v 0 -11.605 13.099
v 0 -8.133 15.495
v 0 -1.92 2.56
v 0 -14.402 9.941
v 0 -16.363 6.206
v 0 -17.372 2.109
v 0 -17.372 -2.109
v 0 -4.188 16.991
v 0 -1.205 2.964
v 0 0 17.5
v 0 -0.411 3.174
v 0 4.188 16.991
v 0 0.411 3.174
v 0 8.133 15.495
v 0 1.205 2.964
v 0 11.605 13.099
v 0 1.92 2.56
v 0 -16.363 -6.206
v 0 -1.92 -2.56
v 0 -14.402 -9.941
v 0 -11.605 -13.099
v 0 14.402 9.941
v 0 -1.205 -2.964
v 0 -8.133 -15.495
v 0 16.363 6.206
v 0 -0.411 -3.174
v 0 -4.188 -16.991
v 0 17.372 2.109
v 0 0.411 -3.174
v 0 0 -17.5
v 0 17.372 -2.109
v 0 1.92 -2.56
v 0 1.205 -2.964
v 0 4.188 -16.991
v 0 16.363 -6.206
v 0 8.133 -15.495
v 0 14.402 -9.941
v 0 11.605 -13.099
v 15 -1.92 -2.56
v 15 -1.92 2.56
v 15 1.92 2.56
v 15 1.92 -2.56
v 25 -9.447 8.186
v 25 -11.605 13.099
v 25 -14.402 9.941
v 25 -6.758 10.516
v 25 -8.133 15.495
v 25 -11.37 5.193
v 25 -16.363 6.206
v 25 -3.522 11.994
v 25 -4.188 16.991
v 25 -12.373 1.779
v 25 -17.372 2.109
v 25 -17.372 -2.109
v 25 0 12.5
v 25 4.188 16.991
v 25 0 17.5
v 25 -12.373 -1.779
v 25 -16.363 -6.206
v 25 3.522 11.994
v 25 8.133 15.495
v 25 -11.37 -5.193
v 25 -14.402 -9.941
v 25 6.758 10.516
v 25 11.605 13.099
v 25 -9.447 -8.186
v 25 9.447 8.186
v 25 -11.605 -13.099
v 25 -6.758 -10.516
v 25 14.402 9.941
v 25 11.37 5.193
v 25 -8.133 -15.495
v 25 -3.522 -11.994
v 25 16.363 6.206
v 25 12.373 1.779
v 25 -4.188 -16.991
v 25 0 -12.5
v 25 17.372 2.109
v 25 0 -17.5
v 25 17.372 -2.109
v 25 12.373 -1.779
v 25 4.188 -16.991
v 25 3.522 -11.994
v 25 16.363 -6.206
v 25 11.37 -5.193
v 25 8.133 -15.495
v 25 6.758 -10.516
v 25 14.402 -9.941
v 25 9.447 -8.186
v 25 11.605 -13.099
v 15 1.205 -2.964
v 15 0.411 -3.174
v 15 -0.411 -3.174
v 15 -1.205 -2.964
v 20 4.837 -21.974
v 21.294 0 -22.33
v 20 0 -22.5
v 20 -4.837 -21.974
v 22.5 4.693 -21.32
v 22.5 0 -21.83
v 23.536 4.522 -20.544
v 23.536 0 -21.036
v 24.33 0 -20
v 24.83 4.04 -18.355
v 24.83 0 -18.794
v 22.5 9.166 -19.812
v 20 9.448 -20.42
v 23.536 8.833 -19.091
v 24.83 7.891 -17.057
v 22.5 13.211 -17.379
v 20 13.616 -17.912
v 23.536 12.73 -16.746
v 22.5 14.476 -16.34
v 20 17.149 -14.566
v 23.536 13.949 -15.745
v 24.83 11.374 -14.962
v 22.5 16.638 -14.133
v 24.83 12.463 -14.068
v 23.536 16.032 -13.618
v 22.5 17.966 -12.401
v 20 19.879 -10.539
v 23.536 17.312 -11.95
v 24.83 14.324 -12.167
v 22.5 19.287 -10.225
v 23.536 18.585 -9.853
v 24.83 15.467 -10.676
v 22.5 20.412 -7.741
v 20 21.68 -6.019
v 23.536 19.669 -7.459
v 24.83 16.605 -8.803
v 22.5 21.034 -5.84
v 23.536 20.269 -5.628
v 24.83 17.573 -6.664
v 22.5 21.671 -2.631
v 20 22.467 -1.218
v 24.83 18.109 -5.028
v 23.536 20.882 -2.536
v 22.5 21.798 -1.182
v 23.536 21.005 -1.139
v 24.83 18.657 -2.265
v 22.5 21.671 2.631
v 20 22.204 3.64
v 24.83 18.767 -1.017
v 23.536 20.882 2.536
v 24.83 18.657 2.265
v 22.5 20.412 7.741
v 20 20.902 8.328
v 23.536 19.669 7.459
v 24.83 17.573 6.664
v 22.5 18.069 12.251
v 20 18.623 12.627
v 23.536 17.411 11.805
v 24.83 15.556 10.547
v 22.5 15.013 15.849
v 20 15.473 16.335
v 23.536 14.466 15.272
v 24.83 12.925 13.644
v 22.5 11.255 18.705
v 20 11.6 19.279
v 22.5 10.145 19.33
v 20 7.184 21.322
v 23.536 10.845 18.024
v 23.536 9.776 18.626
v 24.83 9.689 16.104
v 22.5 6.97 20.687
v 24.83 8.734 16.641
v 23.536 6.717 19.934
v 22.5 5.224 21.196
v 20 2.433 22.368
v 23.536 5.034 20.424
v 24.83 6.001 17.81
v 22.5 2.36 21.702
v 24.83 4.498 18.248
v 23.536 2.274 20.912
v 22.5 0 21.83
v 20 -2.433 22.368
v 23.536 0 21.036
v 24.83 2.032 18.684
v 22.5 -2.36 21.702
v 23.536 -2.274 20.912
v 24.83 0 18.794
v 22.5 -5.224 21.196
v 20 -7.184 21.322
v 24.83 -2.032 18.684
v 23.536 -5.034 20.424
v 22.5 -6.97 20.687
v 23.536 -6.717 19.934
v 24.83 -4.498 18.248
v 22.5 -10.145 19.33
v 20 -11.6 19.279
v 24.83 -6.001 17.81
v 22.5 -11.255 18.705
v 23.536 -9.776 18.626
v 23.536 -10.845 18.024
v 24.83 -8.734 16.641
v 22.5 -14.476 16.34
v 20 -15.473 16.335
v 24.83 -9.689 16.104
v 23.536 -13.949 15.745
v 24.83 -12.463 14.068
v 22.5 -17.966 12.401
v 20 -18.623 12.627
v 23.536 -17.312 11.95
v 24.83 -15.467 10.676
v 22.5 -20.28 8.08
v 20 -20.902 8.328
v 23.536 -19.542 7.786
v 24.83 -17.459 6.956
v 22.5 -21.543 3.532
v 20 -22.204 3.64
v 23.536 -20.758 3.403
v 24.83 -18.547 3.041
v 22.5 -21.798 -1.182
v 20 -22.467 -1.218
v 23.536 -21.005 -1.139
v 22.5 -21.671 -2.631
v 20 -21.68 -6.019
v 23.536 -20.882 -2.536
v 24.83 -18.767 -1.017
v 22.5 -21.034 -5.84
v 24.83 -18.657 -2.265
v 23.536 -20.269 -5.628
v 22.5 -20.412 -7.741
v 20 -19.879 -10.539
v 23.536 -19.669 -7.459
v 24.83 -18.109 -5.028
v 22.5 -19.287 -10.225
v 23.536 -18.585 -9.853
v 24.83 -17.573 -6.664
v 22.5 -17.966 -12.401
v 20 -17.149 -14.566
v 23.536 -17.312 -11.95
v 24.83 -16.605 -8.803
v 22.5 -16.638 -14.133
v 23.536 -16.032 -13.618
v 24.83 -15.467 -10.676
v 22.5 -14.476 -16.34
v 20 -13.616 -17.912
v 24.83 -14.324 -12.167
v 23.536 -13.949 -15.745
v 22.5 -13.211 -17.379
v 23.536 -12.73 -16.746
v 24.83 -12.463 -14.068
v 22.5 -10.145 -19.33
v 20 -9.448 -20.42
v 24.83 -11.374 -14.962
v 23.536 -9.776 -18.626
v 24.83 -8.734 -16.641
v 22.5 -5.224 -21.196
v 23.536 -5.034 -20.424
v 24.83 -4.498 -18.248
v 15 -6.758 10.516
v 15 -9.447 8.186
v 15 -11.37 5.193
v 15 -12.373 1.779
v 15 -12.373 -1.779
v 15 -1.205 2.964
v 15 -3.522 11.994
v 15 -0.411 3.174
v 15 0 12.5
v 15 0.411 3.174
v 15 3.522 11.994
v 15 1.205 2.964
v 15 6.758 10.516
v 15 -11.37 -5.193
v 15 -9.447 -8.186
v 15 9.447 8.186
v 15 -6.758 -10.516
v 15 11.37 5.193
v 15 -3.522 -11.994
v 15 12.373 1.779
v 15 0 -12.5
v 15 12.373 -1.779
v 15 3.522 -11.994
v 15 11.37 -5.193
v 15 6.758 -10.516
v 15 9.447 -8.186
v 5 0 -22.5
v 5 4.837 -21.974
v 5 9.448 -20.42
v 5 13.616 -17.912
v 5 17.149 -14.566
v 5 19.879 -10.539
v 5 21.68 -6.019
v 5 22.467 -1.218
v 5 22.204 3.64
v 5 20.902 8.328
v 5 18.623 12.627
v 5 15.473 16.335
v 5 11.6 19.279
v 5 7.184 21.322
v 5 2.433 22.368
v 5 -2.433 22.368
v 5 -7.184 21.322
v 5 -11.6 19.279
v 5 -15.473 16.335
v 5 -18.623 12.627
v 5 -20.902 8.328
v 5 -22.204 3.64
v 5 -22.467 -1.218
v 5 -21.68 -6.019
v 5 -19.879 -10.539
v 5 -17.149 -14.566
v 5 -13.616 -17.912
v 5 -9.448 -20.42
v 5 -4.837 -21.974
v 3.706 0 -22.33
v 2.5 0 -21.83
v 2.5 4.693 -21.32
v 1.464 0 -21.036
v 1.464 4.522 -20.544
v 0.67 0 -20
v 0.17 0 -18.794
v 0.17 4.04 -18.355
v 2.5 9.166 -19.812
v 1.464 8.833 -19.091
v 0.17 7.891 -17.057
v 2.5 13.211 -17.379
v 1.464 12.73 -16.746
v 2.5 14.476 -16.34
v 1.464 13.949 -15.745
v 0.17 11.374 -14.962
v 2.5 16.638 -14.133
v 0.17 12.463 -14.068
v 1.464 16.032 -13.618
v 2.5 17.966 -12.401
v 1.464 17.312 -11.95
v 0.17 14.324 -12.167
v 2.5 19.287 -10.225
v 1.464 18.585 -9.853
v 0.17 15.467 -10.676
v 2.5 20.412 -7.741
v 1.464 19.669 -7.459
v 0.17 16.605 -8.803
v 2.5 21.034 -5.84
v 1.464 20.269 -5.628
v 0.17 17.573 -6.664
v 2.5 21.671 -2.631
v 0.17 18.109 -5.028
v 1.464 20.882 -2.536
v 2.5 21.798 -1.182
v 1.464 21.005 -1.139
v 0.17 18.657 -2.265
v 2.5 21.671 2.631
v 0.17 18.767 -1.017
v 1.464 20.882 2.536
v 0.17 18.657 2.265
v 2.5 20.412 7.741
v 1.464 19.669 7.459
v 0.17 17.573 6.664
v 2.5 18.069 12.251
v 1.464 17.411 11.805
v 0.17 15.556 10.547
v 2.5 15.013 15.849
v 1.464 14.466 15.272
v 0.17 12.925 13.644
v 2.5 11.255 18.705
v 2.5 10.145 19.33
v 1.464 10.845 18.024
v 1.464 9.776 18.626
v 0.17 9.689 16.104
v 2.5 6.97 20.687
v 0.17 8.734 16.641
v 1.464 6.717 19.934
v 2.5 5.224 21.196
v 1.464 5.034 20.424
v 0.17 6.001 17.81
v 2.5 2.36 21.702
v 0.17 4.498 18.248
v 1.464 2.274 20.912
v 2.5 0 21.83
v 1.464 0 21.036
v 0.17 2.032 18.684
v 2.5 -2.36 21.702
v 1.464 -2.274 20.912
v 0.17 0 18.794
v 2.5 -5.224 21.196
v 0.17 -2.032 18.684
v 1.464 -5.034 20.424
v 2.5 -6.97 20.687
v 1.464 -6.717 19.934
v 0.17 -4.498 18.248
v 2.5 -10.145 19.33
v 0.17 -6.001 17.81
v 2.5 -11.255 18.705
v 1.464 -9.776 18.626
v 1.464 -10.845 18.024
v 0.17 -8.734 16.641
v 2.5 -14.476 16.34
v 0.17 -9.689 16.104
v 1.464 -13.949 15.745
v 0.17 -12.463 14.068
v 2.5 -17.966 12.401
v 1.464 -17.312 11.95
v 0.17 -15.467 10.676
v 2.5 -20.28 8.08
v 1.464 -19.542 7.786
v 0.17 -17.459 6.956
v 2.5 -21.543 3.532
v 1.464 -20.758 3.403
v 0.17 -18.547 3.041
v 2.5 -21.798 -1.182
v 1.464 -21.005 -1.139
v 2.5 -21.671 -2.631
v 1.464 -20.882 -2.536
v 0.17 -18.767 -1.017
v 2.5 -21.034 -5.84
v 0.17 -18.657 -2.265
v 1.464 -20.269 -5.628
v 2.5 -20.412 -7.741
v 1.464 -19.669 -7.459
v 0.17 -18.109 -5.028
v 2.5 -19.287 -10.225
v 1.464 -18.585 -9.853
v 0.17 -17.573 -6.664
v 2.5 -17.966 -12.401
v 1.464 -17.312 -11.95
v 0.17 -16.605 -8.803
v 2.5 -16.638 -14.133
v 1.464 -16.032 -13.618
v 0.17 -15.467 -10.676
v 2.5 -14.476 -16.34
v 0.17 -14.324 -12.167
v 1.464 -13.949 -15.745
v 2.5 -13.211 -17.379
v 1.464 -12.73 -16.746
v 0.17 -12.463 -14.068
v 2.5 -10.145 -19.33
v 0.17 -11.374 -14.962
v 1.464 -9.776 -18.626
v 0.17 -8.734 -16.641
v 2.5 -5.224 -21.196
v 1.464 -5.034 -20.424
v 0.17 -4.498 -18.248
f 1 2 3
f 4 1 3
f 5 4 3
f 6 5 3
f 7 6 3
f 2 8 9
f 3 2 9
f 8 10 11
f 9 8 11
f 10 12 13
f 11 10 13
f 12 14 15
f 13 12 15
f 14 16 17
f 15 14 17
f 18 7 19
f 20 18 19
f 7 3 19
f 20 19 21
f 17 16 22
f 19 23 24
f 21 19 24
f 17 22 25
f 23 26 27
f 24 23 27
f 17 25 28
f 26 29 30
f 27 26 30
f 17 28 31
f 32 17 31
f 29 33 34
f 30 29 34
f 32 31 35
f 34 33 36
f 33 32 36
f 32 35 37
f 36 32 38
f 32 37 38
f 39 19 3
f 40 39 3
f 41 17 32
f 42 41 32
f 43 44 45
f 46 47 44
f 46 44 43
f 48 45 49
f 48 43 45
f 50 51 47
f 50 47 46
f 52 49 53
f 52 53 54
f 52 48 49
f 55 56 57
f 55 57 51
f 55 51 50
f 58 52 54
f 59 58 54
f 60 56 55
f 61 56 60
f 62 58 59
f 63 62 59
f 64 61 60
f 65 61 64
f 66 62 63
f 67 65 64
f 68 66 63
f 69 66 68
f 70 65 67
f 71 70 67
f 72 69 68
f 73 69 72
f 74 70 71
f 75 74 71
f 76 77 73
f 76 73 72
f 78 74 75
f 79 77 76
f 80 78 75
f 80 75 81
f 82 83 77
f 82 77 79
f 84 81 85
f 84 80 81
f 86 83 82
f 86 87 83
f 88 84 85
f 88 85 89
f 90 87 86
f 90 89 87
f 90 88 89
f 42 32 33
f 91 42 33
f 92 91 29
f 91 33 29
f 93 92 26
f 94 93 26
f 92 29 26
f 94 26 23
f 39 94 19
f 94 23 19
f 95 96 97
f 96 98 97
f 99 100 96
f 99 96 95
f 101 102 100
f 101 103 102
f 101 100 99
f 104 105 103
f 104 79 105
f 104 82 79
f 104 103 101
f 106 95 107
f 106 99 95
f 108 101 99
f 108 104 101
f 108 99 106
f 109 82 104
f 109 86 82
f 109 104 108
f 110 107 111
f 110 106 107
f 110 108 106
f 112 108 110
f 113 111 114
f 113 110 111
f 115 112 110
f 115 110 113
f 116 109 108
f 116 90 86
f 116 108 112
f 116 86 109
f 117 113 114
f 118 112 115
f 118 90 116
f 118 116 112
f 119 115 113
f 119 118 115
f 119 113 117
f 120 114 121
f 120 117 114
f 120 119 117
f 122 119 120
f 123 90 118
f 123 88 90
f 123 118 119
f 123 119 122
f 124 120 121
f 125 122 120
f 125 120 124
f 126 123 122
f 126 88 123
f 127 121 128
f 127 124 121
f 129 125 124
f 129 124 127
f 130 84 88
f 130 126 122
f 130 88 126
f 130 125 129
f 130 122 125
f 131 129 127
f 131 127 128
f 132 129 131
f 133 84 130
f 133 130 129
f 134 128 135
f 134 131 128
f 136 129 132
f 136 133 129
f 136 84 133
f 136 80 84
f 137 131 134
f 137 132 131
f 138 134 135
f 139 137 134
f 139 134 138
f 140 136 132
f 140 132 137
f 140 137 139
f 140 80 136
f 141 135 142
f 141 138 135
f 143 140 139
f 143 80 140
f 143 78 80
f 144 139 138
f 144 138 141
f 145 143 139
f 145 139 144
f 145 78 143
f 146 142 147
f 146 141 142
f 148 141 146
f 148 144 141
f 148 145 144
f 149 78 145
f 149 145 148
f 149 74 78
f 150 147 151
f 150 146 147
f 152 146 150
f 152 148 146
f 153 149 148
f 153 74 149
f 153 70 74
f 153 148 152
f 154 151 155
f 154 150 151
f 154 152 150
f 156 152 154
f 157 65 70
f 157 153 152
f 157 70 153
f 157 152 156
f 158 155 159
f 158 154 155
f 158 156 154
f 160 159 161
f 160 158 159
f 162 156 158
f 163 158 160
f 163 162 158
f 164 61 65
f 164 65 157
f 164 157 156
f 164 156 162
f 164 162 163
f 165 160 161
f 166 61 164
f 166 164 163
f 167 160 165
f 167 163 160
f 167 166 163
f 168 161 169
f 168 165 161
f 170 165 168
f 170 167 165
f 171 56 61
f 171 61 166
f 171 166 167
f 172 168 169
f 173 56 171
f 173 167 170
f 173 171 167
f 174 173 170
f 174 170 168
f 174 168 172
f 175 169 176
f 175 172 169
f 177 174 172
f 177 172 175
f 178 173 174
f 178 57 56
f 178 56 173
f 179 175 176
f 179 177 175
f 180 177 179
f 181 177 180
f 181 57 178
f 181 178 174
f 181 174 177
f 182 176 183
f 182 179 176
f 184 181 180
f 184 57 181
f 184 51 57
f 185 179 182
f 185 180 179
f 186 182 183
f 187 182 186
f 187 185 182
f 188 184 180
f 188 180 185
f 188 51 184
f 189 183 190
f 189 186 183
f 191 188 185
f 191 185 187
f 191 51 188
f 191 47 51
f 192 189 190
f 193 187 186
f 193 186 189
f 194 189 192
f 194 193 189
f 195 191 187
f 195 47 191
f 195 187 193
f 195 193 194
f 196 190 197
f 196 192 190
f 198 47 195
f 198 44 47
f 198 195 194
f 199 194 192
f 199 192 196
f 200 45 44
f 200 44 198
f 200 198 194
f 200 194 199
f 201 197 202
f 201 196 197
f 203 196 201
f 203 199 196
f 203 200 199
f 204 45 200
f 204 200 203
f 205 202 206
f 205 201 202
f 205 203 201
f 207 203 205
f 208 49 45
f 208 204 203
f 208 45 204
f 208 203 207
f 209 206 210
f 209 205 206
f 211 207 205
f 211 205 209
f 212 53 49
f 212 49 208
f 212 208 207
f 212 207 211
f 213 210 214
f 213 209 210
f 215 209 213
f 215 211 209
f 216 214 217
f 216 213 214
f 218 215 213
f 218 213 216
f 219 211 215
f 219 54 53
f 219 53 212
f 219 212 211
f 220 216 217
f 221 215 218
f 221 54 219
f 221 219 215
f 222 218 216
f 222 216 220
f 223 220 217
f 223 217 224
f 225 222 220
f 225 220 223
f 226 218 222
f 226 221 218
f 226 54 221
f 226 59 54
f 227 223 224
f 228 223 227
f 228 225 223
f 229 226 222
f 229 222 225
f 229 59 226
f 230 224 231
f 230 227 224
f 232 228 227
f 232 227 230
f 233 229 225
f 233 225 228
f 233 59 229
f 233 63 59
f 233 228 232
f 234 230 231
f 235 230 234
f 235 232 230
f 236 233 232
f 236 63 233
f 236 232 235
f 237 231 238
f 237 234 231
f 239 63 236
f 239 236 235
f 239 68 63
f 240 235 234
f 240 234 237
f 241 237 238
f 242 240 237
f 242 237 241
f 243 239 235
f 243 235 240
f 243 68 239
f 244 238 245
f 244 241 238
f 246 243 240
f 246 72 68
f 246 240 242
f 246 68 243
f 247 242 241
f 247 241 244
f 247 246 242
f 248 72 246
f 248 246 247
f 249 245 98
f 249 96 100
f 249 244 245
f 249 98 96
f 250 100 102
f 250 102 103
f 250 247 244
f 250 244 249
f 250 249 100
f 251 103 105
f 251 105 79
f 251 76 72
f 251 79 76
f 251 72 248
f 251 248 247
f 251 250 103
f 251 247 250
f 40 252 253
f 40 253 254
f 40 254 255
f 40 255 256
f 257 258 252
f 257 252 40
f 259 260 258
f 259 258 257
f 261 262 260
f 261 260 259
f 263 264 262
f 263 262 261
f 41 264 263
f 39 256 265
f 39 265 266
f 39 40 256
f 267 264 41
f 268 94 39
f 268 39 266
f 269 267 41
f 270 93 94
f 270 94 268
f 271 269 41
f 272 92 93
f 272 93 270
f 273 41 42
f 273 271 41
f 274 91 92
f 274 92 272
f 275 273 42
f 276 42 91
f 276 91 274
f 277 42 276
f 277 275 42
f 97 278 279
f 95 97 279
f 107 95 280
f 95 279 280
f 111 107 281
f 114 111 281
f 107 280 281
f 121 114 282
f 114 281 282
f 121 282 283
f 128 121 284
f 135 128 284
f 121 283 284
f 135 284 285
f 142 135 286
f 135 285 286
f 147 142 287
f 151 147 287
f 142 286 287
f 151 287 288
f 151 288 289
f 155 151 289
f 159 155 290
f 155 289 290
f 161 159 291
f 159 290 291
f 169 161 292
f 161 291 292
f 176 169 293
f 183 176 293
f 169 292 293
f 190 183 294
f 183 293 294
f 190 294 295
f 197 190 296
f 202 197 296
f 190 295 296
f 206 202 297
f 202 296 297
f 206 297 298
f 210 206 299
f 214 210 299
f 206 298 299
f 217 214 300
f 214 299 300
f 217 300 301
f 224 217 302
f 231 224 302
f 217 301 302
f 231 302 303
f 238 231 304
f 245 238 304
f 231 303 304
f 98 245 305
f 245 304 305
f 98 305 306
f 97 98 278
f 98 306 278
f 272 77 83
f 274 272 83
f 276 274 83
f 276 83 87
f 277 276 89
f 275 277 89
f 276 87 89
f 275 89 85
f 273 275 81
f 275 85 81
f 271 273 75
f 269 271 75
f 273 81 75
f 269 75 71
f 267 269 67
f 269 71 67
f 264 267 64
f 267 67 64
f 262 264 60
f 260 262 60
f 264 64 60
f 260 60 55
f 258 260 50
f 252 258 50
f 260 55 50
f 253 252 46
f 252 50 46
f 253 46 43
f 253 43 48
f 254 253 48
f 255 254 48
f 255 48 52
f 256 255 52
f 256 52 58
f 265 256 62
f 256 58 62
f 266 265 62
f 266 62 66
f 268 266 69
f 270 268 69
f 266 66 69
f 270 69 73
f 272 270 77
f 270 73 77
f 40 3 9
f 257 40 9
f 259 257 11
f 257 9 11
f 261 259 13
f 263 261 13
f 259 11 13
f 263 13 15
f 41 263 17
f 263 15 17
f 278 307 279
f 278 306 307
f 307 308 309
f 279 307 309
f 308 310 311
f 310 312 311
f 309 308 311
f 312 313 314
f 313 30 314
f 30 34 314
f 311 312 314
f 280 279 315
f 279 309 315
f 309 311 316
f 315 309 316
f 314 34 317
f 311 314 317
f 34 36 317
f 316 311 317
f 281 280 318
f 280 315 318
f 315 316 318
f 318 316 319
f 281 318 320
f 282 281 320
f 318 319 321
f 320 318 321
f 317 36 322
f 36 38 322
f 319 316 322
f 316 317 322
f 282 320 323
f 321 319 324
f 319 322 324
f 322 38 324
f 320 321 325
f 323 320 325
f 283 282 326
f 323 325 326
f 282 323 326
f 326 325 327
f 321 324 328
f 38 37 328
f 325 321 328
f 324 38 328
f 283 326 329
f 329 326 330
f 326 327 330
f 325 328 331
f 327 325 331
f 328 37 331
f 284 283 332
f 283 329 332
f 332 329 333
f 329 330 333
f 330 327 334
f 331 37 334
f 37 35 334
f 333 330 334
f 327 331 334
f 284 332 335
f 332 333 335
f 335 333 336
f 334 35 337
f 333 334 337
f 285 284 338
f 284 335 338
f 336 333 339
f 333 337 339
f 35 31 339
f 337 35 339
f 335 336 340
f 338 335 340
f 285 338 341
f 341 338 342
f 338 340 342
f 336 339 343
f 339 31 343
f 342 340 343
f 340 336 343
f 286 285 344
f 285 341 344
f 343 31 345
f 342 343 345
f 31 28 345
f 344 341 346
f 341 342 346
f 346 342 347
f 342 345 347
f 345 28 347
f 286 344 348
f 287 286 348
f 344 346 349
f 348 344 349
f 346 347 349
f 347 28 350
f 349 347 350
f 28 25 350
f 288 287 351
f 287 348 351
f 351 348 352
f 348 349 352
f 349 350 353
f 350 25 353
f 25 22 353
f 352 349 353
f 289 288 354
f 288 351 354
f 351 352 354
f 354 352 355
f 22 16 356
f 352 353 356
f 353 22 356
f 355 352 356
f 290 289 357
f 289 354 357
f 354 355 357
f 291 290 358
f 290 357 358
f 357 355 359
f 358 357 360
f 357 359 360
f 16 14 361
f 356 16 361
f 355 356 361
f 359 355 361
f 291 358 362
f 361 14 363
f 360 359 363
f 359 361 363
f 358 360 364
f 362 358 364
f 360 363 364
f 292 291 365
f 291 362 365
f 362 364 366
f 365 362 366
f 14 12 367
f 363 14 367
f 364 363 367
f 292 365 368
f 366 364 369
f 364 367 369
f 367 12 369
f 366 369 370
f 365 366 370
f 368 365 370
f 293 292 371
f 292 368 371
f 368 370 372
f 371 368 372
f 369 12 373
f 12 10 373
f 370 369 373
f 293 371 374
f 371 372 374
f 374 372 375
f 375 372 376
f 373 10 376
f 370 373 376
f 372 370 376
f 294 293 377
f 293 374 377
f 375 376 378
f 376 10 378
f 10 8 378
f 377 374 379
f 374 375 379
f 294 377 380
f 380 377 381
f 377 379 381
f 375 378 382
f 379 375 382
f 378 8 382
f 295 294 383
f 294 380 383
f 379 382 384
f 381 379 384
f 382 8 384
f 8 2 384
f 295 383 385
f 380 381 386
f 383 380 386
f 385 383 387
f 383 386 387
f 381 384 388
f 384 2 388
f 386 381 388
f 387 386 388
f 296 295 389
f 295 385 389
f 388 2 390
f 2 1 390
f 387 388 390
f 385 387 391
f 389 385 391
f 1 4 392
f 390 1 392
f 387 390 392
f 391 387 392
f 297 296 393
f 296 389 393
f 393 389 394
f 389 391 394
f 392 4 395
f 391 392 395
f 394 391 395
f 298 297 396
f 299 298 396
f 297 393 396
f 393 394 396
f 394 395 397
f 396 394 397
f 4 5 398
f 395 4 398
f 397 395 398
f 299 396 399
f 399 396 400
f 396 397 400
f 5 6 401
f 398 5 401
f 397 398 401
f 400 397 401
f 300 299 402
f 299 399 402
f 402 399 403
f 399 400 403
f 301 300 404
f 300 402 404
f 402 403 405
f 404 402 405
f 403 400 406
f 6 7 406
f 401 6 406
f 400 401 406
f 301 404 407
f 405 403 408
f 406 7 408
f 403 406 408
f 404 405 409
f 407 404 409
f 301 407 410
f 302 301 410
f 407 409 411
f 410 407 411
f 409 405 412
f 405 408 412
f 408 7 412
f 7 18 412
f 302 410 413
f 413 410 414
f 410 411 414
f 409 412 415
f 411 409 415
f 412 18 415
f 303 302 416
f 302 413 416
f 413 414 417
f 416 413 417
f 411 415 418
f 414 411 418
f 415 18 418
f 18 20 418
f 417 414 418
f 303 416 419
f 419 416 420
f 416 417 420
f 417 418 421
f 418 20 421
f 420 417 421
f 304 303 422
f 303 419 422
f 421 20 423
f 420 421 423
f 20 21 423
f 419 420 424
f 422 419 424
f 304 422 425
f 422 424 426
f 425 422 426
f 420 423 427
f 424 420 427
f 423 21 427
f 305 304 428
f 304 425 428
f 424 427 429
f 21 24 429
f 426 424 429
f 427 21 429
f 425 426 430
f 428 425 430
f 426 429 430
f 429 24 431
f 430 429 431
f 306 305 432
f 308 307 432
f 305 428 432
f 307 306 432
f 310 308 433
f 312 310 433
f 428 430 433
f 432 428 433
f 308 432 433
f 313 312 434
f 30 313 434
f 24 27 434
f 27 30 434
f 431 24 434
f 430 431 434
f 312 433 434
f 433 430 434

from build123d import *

# Parameters (mm, degrees)
SKETCH1_R           = 22.5
BOSS_EXTRUDE1_DEPTH = 25
SKETCH2_R           = 12.5
CUT_EXTRUDE1_DEPTH  = 10
FILLET1_R           = 5
SKETCH3_R           = 1.5
CUT_EXTRUDE2_DEPTH  = 41.466035196
CUT_EXTRUDE3_DEPTH  = 41.466035196


with BuildPart() as part:
    # Sketch1 → Boss-Extrude1 (new body)
    with BuildSketch(Plane(origin=(0, 0, 0), x_dir=(0, 0, -1), z_dir=(1, 0, 0))):
        Circle(SKETCH1_R)
    extrude(amount=BOSS_EXTRUDE1_DEPTH)

    # Sketch2 → Cut-Extrude1 (cut)
    with BuildSketch(Plane(origin=(25, 0, 0), x_dir=(0, 0, -1), z_dir=(1, 0, 0))):
        Circle(SKETCH2_R)
    extrude(amount=-CUT_EXTRUDE1_DEPTH, mode=Mode.SUBTRACT)

    # Fillet1
    fillet1_edges = [part.edges().sort_by_distance(p)[0] for p in [
        (0, 0, 22.5),
        (25, 0, 22.5),
    ]]
    fillet(fillet1_edges, radius=FILLET1_R)

    # Sketch3 → Cut-Extrude2 (cut, through all)
    with BuildSketch(Plane.ZY):
        Circle(SKETCH3_R)
    extrude(amount=-CUT_EXTRUDE2_DEPTH, mode=Mode.SUBTRACT)

    # Sketch4 → Cut-Extrude3 (cut, through all)
    with BuildSketch(Plane.ZY):
        with BuildLine():
            Line((-2.56, -1.92), (2.56, -1.92))
            ThreePointArc((2.56, -1.92), (3.2, 0), (2.56, 1.92))
            Line((2.56, 1.92), (-2.56, 1.92))
            ThreePointArc((-2.56, 1.92), (-3.2, 0), (-2.56, -1.92))
        make_face()
    extrude(amount=-CUT_EXTRUDE3_DEPTH, mode=Mode.SUBTRACT)


solid = part.part
